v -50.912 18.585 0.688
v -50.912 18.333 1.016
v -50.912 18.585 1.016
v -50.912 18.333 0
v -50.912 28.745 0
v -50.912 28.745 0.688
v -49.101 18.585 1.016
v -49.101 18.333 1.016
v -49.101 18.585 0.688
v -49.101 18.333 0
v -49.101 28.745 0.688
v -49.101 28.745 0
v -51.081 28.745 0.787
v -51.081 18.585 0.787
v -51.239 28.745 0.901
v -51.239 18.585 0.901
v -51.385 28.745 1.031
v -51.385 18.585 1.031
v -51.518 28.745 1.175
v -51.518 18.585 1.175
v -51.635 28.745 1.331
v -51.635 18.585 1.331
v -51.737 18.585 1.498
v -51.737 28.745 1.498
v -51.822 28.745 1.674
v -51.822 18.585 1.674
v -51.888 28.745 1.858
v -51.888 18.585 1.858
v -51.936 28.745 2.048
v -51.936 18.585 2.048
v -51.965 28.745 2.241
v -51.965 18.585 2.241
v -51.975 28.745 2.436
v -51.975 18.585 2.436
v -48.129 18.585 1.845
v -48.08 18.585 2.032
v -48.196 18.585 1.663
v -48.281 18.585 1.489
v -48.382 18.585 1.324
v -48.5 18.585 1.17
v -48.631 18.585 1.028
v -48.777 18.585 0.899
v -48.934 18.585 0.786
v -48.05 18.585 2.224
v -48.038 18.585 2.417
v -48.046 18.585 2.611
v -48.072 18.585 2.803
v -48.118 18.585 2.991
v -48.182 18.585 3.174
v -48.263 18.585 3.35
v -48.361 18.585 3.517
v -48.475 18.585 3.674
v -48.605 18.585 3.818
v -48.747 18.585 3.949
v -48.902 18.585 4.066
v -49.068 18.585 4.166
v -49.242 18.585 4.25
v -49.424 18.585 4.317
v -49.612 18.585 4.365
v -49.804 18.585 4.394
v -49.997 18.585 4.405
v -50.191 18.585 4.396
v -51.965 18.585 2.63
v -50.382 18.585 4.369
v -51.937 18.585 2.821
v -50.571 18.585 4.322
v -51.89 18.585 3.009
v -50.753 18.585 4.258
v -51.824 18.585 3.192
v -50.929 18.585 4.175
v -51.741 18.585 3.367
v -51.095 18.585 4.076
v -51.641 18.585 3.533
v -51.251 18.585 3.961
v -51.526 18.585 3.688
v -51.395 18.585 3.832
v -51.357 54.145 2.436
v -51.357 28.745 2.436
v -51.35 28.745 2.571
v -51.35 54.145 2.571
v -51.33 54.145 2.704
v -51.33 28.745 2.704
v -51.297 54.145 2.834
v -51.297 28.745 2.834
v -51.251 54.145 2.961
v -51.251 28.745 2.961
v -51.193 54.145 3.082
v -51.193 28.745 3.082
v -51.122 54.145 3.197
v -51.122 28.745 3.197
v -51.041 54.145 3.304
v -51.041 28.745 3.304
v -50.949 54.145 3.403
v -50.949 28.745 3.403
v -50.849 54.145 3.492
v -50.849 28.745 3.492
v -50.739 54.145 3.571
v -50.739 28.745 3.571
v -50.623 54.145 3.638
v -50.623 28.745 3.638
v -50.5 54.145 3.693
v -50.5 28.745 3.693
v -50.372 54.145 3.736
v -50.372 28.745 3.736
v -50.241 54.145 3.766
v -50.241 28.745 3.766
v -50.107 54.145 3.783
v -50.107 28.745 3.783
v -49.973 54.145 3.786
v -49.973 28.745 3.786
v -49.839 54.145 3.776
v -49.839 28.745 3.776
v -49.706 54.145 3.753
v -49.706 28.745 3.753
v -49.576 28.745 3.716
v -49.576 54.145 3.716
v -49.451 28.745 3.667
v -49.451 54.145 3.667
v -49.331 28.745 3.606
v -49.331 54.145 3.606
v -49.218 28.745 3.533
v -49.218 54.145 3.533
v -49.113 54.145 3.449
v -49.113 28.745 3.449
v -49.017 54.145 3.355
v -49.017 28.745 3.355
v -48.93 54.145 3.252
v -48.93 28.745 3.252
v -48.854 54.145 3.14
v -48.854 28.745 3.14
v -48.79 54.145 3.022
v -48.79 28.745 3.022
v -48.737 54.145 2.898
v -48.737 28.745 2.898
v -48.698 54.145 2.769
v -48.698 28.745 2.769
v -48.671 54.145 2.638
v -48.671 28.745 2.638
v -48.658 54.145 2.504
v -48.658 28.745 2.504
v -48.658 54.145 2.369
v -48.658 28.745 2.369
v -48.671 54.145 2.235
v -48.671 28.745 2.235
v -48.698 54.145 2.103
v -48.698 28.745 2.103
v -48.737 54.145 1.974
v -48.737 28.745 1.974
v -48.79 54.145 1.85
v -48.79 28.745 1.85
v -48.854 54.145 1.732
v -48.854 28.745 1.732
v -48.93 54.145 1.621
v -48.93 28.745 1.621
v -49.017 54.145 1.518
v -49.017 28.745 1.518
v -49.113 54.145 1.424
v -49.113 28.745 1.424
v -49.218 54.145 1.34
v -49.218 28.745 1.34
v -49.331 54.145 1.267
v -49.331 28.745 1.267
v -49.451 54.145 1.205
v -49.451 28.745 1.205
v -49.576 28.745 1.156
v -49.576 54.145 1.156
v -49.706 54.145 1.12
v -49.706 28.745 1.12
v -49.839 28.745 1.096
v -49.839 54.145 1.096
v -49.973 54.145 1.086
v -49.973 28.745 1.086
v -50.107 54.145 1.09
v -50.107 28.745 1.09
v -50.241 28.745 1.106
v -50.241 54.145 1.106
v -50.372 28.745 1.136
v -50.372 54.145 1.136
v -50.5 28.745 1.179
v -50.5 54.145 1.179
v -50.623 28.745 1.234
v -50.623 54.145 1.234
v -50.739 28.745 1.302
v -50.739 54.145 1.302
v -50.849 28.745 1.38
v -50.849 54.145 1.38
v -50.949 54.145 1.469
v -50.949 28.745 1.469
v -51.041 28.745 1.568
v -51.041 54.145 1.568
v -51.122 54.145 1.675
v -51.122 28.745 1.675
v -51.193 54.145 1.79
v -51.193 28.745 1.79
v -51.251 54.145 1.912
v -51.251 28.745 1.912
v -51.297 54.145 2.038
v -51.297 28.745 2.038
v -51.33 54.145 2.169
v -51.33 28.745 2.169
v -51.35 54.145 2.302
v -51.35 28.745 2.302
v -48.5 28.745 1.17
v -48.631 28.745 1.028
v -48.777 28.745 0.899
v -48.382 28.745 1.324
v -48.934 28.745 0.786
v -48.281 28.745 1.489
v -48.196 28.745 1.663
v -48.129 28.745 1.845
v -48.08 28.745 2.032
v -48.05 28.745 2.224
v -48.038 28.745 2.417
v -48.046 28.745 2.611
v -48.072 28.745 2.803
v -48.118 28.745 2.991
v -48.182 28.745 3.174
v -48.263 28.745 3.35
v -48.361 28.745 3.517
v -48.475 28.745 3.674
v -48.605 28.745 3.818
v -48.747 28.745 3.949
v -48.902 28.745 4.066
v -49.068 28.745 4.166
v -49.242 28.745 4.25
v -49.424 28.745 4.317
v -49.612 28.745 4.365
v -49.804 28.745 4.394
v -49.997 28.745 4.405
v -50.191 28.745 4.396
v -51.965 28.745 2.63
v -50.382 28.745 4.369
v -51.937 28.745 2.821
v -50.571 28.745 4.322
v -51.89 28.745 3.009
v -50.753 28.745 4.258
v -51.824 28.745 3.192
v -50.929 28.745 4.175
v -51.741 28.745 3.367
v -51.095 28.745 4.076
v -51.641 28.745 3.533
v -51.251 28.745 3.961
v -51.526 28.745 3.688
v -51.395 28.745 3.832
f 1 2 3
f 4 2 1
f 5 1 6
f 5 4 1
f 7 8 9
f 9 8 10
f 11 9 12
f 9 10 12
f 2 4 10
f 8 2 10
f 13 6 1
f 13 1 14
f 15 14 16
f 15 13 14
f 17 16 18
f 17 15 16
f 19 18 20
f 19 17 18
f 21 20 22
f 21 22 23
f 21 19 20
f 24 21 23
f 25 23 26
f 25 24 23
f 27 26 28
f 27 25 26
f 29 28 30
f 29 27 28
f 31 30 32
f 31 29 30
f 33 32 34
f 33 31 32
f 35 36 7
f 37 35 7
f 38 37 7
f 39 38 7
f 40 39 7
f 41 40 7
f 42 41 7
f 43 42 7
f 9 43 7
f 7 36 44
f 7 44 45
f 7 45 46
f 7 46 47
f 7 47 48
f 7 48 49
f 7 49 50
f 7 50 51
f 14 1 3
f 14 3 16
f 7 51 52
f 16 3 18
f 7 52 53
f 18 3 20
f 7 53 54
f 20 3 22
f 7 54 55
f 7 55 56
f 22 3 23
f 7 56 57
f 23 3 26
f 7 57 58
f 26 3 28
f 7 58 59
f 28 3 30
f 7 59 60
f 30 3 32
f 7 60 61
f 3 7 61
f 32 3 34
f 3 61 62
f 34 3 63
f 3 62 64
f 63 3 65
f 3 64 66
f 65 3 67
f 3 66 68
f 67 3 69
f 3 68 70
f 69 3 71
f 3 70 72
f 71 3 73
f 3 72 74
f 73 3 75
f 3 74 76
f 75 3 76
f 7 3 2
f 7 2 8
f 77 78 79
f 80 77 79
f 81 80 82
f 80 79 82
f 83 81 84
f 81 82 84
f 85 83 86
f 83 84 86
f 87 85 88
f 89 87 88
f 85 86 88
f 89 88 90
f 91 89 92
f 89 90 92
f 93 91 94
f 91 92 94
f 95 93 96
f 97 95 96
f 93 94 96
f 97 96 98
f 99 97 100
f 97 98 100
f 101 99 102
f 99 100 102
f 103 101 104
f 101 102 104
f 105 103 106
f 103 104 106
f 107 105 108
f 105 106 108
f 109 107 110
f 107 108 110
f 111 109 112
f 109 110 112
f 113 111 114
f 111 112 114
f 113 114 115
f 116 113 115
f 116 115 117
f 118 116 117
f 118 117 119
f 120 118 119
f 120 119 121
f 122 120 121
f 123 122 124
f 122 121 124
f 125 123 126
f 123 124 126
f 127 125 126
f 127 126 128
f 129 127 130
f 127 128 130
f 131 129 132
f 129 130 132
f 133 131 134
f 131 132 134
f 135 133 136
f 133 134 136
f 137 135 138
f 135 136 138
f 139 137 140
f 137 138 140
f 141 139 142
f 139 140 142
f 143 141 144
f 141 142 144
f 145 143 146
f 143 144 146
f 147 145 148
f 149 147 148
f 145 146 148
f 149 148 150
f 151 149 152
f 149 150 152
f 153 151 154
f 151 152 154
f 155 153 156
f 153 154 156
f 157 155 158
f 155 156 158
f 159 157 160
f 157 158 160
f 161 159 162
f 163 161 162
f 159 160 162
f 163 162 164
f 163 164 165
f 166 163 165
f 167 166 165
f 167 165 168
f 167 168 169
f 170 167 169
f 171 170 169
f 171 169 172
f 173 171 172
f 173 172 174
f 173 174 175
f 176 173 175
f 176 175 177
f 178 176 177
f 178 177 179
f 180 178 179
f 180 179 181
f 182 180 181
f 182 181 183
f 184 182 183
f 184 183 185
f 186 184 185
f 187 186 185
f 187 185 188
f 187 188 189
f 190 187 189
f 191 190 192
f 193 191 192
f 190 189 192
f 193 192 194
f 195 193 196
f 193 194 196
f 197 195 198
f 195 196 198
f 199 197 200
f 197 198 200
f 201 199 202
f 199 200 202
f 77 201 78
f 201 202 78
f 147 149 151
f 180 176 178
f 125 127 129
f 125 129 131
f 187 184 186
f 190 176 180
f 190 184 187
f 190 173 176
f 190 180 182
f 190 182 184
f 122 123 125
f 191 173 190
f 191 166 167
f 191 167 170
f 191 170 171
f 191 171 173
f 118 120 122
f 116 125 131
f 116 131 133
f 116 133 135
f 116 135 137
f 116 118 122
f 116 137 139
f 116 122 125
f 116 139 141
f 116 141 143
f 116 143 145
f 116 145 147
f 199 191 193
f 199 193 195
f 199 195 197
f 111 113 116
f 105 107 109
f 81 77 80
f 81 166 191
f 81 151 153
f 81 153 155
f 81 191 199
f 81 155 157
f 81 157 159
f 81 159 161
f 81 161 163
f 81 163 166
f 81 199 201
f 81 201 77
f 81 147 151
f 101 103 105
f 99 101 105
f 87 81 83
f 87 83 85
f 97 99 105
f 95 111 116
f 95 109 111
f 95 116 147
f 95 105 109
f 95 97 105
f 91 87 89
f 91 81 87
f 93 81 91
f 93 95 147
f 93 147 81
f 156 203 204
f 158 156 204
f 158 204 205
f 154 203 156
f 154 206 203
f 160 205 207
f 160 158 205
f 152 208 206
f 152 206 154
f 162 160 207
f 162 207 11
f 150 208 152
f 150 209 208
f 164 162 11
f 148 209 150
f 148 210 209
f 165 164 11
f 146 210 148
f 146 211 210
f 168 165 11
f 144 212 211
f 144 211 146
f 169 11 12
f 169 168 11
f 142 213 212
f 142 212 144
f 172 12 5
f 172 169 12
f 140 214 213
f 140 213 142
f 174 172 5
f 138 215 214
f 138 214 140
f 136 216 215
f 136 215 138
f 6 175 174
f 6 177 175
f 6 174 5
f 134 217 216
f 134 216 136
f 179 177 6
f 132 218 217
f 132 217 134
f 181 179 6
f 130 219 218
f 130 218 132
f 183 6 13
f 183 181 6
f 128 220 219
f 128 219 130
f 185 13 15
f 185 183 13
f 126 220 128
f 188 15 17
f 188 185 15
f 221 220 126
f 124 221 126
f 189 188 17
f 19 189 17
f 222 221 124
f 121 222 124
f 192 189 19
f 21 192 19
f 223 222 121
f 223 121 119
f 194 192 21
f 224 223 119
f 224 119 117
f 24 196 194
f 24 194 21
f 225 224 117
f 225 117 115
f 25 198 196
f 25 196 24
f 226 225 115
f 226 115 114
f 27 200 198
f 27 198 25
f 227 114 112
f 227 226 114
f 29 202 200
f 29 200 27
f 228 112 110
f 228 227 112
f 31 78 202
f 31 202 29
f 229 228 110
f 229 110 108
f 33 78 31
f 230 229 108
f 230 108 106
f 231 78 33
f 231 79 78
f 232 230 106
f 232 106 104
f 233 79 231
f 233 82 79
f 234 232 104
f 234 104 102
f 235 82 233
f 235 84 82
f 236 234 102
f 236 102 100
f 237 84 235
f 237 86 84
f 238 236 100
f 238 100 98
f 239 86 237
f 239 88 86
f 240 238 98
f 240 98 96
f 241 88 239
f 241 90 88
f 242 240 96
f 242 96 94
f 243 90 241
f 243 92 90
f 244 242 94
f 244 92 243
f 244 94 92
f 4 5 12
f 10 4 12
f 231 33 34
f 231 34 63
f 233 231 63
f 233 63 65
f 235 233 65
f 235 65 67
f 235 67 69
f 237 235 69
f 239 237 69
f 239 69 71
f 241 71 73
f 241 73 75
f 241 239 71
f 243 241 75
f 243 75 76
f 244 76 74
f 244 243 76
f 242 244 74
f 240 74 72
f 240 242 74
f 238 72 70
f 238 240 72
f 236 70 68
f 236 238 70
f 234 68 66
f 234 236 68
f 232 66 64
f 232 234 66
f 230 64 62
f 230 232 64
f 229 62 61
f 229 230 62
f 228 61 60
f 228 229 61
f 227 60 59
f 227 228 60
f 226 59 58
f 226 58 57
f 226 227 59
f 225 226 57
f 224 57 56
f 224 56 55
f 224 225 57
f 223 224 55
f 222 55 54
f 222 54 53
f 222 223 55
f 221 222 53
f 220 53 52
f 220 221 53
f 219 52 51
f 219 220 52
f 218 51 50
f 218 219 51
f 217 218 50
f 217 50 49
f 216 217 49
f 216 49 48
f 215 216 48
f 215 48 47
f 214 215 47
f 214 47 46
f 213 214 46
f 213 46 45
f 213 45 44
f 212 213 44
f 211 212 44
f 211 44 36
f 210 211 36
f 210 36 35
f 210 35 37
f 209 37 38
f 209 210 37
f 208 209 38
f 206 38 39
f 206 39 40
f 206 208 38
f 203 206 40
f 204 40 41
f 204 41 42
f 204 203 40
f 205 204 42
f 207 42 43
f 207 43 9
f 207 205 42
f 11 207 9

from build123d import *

# Parameters (mm, degrees)
F0_W     = 1.8106922507
F0_H     = 10.411484167
F1_DEPTH = 1.016
F3_DEPTH = 10.16
F4_R     = 1.3504663761
F5_DEPTH = 25.4


with BuildPart() as f1:
    # F0 (on Top) → F1 (new body)
    with BuildSketch(Plane.XY):
        with Locations((-50.0065051019, 23.5388400033)):
            Rectangle(F0_W, F0_H)
    extrude(amount=F1_DEPTH)

    # F2 (on face) → F3 (join)
    with BuildSketch(Plane(origin=(0, 28.7445820868, 0), x_dir=(-1, 0, 0), z_dir=(0, 1, 0))):
        with BuildLine():
            ThreePointArc((50.9118512273, 0.6882785491), (51.6883442883, 1.4132903762), (51.9750051019, 2.4362318218))
            ThreePointArc((51.9750051019, 2.4362318218), (48.9835636563, 4.1180710082), (49.1011589766, 0.6882785491))
            Line((49.1011589766, 0.6882785491), (49.1011589766, 1.016))
            Line((49.1011589766, 1.016), (50.9118512273, 1.016))
            Line((50.9118512273, 1.016), (50.9118512273, 0.6882785491))
        make_face()
    extrude(amount=-F3_DEPTH)

    # F4 (on face) → F5 (join)
    with BuildSketch(Plane(origin=(0, 28.7445820868, 0), x_dir=(-1, 0, 0), z_dir=(0, 1, 0))):
        with Locations((50.0065051019, 2.4362318218)):
            Circle(F4_R)
    extrude(amount=F5_DEPTH)


solid = f1.part
